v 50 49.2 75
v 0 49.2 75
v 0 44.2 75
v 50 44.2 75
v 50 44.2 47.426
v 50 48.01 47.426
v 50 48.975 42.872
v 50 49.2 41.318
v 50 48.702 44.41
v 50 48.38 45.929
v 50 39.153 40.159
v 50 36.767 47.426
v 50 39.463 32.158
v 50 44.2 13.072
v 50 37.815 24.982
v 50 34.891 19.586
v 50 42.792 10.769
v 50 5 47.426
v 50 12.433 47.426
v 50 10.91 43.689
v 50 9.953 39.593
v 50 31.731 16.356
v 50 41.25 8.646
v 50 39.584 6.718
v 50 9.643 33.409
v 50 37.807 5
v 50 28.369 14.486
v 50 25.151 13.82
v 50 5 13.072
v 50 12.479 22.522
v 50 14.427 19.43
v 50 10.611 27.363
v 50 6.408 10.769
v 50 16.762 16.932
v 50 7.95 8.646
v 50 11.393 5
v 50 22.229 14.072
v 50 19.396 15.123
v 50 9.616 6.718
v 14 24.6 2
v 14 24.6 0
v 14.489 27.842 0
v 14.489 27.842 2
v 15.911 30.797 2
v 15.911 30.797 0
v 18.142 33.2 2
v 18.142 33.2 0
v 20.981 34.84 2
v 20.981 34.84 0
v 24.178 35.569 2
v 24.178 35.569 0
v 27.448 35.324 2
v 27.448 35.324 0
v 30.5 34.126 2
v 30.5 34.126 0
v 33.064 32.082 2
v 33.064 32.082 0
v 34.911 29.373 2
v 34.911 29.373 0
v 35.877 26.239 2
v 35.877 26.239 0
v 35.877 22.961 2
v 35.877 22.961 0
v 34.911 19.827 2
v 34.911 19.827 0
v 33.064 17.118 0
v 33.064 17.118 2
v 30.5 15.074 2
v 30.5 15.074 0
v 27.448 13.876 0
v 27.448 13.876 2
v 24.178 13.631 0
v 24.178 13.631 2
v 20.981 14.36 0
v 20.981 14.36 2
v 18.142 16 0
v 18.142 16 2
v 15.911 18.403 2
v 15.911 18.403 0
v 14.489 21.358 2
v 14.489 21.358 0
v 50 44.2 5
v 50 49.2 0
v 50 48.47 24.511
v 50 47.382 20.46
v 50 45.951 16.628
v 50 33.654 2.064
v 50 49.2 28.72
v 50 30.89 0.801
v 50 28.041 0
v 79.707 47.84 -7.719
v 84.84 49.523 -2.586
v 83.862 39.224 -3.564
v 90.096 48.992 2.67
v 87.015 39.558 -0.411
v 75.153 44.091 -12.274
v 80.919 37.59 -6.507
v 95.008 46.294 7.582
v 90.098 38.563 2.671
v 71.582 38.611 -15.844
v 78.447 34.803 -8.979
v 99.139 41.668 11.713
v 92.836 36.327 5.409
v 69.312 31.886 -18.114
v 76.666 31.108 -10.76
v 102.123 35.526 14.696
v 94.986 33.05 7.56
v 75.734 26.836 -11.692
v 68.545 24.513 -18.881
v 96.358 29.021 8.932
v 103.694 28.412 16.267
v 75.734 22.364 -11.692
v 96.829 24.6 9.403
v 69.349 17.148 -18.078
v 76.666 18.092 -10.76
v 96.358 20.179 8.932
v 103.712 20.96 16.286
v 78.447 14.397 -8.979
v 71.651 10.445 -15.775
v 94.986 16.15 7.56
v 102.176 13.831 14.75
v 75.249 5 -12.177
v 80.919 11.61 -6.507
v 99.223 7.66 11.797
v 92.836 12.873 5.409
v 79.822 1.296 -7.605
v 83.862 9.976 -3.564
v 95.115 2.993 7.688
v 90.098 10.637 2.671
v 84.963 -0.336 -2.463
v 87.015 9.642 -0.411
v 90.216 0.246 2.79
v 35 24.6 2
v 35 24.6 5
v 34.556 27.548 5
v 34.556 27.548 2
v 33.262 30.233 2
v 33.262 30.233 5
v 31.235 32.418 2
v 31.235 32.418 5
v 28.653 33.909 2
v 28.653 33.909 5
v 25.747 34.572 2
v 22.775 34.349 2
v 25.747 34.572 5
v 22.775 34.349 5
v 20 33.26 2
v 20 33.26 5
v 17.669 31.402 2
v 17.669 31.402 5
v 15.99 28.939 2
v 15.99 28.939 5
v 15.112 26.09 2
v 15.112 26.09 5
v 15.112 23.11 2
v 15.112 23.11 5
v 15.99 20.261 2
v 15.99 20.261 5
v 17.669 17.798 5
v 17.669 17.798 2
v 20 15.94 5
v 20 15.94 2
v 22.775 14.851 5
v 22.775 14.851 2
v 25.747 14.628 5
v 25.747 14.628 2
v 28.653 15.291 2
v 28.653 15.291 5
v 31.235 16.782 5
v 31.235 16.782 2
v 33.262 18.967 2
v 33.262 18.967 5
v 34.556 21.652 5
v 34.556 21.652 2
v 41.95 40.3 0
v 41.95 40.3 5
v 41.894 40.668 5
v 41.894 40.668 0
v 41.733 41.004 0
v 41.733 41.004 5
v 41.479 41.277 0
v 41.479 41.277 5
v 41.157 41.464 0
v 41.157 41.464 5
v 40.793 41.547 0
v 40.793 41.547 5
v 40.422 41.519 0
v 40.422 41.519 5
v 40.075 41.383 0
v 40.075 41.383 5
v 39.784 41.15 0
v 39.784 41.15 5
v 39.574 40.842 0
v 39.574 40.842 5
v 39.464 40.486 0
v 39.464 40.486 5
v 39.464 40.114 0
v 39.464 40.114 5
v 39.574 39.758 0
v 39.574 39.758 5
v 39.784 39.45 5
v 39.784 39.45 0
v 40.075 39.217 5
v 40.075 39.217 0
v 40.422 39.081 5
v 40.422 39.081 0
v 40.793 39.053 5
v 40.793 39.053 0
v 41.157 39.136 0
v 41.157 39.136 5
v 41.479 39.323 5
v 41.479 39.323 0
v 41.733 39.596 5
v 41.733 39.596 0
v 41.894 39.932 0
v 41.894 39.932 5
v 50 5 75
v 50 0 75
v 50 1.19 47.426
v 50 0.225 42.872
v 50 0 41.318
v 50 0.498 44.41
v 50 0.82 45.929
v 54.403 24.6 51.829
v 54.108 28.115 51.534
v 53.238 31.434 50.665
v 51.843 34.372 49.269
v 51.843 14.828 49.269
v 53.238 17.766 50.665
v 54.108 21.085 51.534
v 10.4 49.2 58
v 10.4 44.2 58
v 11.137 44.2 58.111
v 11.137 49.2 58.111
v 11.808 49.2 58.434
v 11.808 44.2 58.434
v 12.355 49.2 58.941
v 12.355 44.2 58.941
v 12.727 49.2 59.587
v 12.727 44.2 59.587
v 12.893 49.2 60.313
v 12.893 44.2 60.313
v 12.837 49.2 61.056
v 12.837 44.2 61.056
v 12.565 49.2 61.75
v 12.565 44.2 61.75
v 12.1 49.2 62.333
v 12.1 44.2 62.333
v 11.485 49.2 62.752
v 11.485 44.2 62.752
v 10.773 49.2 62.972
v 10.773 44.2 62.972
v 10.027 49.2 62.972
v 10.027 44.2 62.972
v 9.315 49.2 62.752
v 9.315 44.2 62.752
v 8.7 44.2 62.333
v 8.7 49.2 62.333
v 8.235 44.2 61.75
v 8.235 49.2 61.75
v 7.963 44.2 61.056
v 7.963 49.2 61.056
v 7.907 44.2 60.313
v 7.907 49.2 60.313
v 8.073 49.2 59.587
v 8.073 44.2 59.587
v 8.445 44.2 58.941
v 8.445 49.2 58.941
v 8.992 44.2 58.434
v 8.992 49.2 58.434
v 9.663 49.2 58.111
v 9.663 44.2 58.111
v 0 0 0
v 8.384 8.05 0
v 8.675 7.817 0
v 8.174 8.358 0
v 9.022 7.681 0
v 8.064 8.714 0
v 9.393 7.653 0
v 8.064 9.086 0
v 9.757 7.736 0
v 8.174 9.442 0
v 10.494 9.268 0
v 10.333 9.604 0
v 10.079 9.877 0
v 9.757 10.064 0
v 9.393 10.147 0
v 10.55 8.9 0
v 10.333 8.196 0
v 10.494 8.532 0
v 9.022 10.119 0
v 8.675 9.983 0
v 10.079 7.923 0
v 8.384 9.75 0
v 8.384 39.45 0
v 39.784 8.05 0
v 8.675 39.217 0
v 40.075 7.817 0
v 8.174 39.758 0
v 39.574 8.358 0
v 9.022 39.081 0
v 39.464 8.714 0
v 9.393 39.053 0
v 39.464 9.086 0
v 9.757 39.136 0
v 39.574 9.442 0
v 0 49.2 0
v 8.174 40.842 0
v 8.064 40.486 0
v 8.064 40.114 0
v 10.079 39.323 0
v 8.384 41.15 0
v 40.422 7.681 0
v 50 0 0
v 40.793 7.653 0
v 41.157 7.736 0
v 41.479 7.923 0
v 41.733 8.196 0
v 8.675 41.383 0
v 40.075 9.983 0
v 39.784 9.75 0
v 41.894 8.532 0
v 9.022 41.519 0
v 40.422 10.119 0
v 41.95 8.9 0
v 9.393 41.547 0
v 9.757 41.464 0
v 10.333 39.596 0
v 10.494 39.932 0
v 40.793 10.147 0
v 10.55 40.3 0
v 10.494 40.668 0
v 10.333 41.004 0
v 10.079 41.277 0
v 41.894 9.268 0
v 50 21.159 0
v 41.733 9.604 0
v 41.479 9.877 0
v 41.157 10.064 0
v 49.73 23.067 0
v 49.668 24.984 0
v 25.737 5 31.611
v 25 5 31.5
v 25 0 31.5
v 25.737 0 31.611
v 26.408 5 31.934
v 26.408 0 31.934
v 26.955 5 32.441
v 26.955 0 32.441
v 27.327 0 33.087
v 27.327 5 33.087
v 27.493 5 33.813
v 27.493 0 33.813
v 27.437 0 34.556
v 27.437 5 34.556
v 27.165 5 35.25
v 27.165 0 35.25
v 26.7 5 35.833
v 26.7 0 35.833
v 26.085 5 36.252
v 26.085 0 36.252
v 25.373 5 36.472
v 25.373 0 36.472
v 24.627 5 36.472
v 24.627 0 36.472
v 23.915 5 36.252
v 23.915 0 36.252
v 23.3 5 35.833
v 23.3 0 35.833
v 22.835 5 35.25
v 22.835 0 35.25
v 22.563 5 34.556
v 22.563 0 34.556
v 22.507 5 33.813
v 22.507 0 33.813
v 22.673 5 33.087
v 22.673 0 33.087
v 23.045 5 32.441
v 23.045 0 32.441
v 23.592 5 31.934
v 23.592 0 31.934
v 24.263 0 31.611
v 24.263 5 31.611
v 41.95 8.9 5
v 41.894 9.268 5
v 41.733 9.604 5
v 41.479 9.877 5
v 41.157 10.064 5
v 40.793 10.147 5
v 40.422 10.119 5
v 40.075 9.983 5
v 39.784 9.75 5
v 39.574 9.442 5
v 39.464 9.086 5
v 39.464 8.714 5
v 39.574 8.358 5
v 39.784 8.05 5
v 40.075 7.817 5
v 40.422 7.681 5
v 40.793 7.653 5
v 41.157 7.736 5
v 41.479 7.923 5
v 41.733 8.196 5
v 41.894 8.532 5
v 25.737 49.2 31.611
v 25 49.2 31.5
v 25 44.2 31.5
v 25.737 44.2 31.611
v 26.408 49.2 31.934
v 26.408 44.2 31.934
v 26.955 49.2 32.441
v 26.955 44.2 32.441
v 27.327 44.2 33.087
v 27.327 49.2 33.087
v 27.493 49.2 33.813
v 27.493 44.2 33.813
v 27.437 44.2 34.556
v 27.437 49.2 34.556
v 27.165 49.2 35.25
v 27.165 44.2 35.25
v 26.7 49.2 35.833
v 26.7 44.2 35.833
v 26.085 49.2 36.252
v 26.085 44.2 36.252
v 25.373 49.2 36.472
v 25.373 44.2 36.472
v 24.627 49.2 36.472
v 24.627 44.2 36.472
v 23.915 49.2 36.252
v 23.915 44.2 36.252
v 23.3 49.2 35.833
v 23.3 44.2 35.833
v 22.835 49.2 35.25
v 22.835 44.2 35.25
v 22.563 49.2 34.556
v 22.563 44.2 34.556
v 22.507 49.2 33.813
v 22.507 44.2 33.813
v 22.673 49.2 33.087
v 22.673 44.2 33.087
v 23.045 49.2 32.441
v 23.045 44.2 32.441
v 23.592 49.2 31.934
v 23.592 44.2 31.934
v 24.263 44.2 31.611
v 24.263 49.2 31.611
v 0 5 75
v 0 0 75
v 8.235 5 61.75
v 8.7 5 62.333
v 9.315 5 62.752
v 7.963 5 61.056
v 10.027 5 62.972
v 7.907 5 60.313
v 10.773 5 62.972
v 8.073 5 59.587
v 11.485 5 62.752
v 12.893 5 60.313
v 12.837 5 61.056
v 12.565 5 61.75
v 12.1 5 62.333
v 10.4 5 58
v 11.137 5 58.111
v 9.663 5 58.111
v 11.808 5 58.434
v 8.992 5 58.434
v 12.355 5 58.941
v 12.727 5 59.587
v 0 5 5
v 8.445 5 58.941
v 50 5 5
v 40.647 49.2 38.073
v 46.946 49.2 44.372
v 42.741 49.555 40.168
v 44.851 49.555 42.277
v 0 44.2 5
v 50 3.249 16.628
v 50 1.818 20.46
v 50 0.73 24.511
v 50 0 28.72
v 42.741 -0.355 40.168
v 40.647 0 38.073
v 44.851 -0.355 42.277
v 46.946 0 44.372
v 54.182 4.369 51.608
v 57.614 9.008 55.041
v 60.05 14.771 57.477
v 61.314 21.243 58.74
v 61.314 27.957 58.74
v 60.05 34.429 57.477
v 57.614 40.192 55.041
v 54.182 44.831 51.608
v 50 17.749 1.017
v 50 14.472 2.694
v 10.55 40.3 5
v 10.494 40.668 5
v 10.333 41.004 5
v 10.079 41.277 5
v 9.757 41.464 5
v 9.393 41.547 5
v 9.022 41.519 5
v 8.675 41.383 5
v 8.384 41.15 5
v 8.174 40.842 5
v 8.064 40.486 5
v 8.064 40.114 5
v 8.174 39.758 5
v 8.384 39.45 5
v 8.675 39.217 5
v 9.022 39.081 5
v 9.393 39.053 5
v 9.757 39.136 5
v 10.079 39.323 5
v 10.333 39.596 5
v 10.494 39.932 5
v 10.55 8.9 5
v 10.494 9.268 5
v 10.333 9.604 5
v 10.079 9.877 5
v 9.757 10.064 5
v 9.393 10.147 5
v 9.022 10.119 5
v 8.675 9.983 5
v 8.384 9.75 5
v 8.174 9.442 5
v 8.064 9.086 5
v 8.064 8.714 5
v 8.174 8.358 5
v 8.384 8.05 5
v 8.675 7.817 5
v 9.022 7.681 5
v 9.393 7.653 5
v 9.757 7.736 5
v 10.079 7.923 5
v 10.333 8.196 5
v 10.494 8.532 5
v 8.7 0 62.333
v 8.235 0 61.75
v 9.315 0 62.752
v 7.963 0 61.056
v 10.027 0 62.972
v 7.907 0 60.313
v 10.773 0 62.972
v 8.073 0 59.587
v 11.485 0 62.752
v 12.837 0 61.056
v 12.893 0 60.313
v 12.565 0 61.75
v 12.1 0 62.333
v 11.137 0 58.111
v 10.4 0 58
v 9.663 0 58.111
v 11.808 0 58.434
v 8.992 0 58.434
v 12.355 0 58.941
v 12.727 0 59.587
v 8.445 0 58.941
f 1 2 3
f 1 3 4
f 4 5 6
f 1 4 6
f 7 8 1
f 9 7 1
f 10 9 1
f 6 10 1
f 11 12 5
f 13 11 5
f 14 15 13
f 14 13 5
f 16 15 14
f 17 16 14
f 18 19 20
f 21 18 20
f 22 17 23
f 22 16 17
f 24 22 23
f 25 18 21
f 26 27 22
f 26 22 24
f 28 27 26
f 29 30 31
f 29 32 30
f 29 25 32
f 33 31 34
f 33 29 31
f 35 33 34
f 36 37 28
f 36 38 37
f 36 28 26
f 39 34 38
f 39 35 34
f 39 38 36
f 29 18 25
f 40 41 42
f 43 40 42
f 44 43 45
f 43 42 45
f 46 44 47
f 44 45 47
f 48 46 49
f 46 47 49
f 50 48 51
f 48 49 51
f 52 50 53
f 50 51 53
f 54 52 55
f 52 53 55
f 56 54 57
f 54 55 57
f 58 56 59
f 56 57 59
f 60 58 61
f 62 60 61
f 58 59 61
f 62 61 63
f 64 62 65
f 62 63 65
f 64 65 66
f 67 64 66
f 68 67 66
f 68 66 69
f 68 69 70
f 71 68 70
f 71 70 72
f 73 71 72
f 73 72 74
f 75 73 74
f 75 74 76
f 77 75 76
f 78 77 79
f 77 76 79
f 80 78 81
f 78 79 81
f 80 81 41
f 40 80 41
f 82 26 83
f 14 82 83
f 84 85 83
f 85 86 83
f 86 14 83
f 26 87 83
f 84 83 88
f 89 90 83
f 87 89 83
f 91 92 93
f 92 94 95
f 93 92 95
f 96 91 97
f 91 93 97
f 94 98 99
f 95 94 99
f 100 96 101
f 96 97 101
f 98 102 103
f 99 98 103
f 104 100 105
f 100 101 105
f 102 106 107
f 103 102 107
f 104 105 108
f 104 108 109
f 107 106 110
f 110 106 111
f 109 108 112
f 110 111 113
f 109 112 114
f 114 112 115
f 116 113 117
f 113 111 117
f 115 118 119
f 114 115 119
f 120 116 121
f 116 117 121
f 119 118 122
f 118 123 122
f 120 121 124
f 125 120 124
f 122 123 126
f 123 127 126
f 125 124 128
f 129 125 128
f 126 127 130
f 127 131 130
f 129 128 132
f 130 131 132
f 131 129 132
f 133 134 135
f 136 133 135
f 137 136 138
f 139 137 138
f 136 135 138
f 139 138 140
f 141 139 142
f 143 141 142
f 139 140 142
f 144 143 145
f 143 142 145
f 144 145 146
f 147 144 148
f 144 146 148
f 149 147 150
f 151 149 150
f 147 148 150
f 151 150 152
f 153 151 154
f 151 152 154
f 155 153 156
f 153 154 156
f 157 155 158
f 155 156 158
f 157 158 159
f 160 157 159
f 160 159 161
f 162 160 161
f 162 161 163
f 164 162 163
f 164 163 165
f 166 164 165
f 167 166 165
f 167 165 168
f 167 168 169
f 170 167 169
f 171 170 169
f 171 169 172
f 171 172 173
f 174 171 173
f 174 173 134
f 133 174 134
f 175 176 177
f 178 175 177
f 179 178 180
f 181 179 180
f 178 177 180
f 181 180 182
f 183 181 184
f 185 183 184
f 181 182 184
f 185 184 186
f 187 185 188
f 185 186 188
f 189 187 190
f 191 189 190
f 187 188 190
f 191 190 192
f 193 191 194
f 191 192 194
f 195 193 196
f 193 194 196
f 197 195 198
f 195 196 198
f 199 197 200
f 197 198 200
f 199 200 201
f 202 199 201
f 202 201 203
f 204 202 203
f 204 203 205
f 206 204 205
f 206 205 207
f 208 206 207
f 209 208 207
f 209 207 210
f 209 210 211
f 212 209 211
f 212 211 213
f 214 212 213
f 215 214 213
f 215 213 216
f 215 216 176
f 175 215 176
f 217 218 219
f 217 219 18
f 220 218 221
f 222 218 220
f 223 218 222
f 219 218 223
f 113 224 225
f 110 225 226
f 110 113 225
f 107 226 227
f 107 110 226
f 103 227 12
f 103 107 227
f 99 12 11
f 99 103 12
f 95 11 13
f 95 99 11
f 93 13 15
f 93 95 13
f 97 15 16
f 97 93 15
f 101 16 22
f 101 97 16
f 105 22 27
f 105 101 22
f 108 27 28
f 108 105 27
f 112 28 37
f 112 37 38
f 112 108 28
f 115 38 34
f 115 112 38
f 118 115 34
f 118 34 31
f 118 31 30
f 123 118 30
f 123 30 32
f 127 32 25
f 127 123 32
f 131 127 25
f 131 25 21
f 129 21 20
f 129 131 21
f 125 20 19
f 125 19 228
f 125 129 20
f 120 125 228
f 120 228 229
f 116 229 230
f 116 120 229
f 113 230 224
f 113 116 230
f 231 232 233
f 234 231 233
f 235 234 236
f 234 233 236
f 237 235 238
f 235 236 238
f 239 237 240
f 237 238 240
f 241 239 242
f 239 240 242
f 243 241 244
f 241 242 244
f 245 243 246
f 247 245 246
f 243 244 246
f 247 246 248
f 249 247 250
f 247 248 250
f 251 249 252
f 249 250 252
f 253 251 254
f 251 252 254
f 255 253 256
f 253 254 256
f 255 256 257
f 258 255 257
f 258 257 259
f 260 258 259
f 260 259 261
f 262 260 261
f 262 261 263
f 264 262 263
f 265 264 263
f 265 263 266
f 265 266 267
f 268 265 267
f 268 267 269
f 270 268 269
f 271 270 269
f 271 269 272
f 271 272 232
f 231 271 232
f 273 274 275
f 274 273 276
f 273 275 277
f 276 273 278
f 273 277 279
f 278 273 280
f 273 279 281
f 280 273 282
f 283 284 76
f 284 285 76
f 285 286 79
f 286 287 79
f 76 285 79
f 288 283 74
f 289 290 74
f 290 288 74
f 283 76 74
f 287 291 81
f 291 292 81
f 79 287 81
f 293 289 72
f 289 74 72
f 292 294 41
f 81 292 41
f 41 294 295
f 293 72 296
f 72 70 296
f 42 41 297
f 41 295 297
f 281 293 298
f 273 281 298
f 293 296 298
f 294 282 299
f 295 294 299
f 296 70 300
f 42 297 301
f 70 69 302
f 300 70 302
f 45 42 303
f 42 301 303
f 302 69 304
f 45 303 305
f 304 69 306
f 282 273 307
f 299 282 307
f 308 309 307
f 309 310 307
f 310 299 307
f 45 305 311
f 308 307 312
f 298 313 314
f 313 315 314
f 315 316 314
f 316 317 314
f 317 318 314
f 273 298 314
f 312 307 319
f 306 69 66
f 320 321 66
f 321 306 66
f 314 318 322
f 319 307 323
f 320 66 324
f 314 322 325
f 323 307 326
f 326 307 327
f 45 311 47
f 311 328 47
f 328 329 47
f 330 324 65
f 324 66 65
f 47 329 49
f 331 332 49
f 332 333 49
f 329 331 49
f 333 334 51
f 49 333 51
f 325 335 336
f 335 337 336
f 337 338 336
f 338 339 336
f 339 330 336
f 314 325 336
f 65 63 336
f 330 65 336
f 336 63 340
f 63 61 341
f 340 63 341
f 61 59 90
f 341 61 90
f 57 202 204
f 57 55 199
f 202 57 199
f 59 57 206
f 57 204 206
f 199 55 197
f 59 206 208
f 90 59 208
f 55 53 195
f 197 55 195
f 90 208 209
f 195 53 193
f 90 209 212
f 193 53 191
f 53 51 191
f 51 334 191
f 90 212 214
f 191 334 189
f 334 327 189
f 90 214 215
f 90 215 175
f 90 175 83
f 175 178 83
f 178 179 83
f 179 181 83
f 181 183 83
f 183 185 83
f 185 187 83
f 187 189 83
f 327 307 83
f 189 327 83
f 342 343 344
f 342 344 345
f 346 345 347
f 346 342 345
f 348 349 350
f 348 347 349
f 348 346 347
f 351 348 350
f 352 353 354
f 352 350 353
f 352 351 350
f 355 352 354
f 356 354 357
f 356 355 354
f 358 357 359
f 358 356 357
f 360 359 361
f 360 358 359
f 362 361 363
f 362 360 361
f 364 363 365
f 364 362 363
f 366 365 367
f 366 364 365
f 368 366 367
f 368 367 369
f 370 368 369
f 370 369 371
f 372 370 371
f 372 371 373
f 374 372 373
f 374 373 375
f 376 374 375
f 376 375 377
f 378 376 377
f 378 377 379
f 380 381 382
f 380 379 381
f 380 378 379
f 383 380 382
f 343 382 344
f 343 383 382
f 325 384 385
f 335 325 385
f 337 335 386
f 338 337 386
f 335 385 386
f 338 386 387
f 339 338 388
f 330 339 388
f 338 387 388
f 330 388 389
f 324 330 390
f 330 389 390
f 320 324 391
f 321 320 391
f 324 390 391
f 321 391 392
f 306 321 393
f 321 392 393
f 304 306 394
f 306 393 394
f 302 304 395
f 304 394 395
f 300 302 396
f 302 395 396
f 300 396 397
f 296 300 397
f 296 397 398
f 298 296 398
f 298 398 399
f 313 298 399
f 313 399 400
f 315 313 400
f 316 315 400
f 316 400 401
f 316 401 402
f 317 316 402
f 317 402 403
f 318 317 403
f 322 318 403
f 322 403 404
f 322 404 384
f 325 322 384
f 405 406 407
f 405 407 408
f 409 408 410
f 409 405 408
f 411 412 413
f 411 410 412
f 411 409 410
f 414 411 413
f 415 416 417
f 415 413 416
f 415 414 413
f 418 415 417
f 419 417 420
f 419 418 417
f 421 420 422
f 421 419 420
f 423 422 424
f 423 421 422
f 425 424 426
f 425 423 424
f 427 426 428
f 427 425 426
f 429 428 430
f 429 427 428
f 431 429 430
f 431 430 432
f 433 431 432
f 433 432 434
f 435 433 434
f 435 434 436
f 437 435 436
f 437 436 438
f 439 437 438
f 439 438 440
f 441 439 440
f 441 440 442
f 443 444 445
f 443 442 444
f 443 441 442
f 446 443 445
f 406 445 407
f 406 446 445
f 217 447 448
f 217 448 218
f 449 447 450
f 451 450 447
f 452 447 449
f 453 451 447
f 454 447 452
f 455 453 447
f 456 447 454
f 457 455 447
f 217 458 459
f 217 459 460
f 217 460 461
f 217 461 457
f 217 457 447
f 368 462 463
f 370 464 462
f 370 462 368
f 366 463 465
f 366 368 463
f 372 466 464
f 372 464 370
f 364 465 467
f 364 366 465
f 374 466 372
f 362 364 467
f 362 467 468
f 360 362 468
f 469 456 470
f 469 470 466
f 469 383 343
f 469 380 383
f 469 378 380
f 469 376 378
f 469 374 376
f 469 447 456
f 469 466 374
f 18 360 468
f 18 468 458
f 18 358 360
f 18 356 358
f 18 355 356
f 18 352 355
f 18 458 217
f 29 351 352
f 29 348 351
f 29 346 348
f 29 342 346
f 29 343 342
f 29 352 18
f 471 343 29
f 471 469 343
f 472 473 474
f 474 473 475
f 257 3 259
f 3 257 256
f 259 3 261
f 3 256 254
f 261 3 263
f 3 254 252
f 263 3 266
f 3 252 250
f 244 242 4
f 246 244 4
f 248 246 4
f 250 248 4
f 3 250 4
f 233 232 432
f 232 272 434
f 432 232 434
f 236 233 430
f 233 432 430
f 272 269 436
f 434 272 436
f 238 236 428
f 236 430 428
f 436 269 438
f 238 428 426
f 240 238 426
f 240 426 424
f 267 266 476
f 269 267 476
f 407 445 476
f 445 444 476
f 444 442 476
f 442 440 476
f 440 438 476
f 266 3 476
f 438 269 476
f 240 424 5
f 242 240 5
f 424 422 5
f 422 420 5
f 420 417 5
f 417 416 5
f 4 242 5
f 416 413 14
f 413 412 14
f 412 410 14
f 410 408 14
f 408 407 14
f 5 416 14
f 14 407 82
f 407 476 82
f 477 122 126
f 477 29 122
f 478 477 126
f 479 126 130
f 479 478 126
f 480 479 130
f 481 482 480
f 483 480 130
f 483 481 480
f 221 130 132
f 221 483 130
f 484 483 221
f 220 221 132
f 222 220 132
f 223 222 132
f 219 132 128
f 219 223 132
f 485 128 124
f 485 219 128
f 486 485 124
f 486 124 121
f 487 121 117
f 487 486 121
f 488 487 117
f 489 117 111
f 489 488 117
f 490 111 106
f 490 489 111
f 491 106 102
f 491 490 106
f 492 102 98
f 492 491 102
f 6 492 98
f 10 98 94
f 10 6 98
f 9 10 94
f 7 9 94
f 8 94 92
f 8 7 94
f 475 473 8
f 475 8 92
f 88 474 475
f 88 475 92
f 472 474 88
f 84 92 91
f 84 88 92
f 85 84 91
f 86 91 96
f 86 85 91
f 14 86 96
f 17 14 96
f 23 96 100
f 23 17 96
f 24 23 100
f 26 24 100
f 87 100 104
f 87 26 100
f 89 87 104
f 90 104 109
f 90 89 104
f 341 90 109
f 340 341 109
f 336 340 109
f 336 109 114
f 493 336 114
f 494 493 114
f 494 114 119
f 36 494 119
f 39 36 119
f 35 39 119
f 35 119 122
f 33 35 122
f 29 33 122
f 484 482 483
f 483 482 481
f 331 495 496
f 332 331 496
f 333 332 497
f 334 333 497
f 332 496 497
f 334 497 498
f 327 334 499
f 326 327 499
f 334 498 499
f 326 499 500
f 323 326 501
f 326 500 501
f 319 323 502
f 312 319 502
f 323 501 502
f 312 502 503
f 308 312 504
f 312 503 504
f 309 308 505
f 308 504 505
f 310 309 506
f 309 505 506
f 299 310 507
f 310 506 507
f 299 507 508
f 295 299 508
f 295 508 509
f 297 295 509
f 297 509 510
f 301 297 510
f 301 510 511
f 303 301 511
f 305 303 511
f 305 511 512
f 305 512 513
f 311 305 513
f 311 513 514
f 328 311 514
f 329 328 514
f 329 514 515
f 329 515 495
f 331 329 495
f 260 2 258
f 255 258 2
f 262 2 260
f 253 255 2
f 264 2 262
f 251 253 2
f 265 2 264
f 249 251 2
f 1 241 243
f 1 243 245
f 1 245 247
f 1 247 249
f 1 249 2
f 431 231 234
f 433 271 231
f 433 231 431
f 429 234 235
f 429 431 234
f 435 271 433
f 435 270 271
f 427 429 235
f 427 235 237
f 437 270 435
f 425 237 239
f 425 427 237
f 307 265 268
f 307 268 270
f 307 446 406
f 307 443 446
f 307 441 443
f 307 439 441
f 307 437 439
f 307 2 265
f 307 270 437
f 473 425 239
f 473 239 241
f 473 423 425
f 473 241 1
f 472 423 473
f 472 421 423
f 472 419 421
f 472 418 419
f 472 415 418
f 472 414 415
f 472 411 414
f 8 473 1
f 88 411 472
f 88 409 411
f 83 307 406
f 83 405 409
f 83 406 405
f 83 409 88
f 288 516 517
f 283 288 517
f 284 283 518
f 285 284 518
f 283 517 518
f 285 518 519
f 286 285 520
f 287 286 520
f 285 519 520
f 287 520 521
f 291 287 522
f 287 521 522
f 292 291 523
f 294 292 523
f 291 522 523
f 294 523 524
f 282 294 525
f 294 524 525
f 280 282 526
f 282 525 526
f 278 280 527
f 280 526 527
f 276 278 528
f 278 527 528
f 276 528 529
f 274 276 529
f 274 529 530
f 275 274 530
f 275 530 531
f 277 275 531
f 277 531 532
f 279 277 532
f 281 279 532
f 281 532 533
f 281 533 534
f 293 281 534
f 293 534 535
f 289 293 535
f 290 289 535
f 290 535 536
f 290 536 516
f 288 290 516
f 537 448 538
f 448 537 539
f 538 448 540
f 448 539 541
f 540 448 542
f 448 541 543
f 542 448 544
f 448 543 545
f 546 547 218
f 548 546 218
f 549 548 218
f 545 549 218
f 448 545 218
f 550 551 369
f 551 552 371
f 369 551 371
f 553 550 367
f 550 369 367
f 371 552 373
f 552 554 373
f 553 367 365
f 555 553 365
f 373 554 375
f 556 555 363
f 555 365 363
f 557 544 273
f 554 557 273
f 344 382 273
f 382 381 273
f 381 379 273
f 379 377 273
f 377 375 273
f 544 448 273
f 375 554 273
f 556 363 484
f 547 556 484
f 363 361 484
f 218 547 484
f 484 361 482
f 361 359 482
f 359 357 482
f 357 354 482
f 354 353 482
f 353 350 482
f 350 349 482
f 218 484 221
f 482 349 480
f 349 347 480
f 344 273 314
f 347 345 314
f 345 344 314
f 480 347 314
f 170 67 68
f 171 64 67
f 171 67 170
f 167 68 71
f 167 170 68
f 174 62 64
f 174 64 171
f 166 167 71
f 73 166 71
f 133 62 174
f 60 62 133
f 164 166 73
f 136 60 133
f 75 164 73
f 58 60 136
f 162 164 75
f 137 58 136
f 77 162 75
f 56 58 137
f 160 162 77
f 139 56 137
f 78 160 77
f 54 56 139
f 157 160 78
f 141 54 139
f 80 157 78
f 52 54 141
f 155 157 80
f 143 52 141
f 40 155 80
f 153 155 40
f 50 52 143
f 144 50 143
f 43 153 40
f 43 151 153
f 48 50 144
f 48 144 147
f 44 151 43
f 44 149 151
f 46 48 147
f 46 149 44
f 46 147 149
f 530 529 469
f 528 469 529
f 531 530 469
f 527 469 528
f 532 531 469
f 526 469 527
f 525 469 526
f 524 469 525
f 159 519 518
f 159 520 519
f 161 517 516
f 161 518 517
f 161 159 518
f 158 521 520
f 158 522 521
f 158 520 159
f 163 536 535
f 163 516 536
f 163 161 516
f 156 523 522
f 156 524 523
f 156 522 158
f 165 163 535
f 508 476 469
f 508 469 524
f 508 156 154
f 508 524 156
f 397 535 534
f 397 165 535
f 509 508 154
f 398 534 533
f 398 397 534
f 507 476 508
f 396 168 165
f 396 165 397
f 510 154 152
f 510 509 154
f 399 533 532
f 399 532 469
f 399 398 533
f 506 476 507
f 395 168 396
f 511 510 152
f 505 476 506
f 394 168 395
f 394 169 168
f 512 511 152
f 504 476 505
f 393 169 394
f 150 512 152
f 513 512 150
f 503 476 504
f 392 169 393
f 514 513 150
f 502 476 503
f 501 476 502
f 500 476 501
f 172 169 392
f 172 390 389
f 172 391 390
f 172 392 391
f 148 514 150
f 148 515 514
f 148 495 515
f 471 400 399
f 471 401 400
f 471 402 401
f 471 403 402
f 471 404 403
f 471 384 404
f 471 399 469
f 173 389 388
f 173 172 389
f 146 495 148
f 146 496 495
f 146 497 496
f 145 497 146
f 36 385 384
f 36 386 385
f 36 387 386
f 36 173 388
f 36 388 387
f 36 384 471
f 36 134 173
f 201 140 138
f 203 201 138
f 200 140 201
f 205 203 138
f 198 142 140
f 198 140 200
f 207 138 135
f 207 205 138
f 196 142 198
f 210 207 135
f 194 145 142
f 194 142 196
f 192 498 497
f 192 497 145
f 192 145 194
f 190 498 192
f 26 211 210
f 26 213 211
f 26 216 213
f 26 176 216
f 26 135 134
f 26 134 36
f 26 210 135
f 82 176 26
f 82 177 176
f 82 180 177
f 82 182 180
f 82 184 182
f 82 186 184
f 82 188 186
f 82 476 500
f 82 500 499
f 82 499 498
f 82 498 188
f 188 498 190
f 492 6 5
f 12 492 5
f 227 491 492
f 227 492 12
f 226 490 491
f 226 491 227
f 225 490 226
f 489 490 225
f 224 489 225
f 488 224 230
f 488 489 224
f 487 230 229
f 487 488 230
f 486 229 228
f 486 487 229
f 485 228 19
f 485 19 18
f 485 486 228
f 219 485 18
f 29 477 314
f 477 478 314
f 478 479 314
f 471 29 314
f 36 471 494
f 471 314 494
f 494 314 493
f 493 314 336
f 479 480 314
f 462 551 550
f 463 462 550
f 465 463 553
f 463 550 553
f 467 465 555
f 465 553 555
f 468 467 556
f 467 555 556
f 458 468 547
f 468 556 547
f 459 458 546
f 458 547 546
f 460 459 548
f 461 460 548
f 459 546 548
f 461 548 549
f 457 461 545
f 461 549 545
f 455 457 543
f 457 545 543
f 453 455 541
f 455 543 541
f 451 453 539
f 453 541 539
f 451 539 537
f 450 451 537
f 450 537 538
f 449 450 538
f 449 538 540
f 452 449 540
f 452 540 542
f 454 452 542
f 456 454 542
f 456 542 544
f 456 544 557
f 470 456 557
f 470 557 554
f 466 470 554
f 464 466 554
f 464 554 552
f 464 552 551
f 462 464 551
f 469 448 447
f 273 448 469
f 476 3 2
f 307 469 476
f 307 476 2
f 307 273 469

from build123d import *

# Parameters (mm, degrees)
ESQUISSE1_W                  = 50
ESQUISSE1_H                  = 49.2
BOSS_EXTRU_1_DEPTH           = 5
ESQUISSE4_W                  = 50
ESQUISSE4_H                  = 5
BOSS_EXTRU_3_DEPTH           = 70
ESQUISSE5_R                  = 10
ESQUISSE5_R_2                = 1.25
ENL_V_MAT_EXTRU_1_DEPTH      = 100.099142277
ESQUISSE6_R                  = 11
ENL_V_MAT_EXTRU_2_DEPTH      = 2
ENL_V_MAT_EXTRU_3_DEPTH      = 103.69196658
ENL_V_MAT_EXTRU_3_DEPTH_BACK = 103.69196658
ESQUISSE7_R                  = 2.5
ESQUISSE8_R                  = 2.5
ENL_V_MAT_EXTRU_4_DEPTH      = 103.69196658
ESQUISSE10_R                 = 25
ESQUISSE10_R_2               = 15
BOSS_EXTRU_4_DEPTH           = 30
ESQUISSE12_W                 = 50
ESQUISSE12_H                 = 70
ENL_V_MAT_EXTRU_6_DEPTH      = 39.2


with BuildPart() as part:
    # Esquisse1 → Boss.-Extru.1 (new body)
    with BuildSketch(Plane.XY):
        with Locations((25, 24.6)):
            Rectangle(ESQUISSE1_W, ESQUISSE1_H)
    extrude(amount=BOSS_EXTRU_1_DEPTH)

    # Esquisse4 → Boss.-Extru.3 (add)
    with BuildSketch(Plane.XY.offset(5)):
        with Locations((25, 46.7)):
            Rectangle(ESQUISSE4_W, ESQUISSE4_H)
        with Locations((25, 2.5)):
            Rectangle(ESQUISSE4_W, ESQUISSE4_H)
    extrude(amount=BOSS_EXTRU_3_DEPTH)

    # Esquisse5 → Enlèv. mat.-Extru.1 (cut, through all)
    with BuildSketch(Plane.XY.offset(5)):
        with Locations((25, 24.6)):
            Circle(ESQUISSE5_R)
        with Locations((9.3, 8.9)):
            Circle(ESQUISSE5_R_2)
        with Locations((40.7, 40.3)):
            Circle(ESQUISSE5_R_2)
        with Locations((40.7, 8.9)):
            Circle(ESQUISSE5_R_2)
        with Locations((9.3, 40.3)):
            Circle(ESQUISSE5_R_2)
    extrude(amount=-ENL_V_MAT_EXTRU_1_DEPTH, mode=Mode.SUBTRACT)

    # Esquisse6 → Enlèv. mat.-Extru.2 (cut)
    with BuildSketch(Plane(origin=(0, 0, 0), x_dir=(-1, 0, 0), z_dir=(0, 0, -1))):
        with Locations((-25, 24.6)):
            Circle(ESQUISSE6_R)
    extrude(amount=-ENL_V_MAT_EXTRU_2_DEPTH, mode=Mode.SUBTRACT)

    # Esquisse7 → Enlèv. mat.-Extru.3 (cut, two sides: drawn at the far end of the back side and taken through both)
    with BuildSketch(Plane.XZ.offset(-ENL_V_MAT_EXTRU_3_DEPTH_BACK)):
        with Locations(Location((25, 34, 0), (0, 0, 270))):
            Circle(ESQUISSE7_R)
    extrude(amount=ENL_V_MAT_EXTRU_3_DEPTH + ENL_V_MAT_EXTRU_3_DEPTH_BACK, mode=Mode.SUBTRACT)

    # Esquisse8 → Enlèv. mat.-Extru.4 (cut, through all)
    with BuildSketch(Plane.XZ):
        with Locations(Location((10.4, 60.5, 0), (0, 0, 270))):
            Circle(ESQUISSE8_R)
    extrude(amount=-ENL_V_MAT_EXTRU_4_DEPTH, mode=Mode.SUBTRACT)

    # Esquisse10 → Boss.-Extru.4 (add, symmetric)
    with BuildSketch(Plane(origin=(50, 5, 5), x_dir=(0.7071067811865476, 0, 0.7071067811865475), z_dir=(-0.7071067811865475, 0, 0.7071067811865476))):
        with Locations(Location((21.226499819, 19.6, 0), (0, 0, 231.628284853))):
            Circle(ESQUISSE10_R)
        with Locations((21.226499819, 19.6)):
            Circle(ESQUISSE10_R_2, mode=Mode.SUBTRACT)
    extrude(amount=BOSS_EXTRU_4_DEPTH, both=True)

    # Esquisse12 → Enlèv. mat.-Extru.6 (cut)
    with BuildSketch(Plane(origin=(0, 5, 0), x_dir=(1, 0, 0), z_dir=(0, 1, 0))):
        with Locations((25, -40)):
            Rectangle(ESQUISSE12_W, ESQUISSE12_H)
    extrude(amount=ENL_V_MAT_EXTRU_6_DEPTH, mode=Mode.SUBTRACT)


solid = part.part
